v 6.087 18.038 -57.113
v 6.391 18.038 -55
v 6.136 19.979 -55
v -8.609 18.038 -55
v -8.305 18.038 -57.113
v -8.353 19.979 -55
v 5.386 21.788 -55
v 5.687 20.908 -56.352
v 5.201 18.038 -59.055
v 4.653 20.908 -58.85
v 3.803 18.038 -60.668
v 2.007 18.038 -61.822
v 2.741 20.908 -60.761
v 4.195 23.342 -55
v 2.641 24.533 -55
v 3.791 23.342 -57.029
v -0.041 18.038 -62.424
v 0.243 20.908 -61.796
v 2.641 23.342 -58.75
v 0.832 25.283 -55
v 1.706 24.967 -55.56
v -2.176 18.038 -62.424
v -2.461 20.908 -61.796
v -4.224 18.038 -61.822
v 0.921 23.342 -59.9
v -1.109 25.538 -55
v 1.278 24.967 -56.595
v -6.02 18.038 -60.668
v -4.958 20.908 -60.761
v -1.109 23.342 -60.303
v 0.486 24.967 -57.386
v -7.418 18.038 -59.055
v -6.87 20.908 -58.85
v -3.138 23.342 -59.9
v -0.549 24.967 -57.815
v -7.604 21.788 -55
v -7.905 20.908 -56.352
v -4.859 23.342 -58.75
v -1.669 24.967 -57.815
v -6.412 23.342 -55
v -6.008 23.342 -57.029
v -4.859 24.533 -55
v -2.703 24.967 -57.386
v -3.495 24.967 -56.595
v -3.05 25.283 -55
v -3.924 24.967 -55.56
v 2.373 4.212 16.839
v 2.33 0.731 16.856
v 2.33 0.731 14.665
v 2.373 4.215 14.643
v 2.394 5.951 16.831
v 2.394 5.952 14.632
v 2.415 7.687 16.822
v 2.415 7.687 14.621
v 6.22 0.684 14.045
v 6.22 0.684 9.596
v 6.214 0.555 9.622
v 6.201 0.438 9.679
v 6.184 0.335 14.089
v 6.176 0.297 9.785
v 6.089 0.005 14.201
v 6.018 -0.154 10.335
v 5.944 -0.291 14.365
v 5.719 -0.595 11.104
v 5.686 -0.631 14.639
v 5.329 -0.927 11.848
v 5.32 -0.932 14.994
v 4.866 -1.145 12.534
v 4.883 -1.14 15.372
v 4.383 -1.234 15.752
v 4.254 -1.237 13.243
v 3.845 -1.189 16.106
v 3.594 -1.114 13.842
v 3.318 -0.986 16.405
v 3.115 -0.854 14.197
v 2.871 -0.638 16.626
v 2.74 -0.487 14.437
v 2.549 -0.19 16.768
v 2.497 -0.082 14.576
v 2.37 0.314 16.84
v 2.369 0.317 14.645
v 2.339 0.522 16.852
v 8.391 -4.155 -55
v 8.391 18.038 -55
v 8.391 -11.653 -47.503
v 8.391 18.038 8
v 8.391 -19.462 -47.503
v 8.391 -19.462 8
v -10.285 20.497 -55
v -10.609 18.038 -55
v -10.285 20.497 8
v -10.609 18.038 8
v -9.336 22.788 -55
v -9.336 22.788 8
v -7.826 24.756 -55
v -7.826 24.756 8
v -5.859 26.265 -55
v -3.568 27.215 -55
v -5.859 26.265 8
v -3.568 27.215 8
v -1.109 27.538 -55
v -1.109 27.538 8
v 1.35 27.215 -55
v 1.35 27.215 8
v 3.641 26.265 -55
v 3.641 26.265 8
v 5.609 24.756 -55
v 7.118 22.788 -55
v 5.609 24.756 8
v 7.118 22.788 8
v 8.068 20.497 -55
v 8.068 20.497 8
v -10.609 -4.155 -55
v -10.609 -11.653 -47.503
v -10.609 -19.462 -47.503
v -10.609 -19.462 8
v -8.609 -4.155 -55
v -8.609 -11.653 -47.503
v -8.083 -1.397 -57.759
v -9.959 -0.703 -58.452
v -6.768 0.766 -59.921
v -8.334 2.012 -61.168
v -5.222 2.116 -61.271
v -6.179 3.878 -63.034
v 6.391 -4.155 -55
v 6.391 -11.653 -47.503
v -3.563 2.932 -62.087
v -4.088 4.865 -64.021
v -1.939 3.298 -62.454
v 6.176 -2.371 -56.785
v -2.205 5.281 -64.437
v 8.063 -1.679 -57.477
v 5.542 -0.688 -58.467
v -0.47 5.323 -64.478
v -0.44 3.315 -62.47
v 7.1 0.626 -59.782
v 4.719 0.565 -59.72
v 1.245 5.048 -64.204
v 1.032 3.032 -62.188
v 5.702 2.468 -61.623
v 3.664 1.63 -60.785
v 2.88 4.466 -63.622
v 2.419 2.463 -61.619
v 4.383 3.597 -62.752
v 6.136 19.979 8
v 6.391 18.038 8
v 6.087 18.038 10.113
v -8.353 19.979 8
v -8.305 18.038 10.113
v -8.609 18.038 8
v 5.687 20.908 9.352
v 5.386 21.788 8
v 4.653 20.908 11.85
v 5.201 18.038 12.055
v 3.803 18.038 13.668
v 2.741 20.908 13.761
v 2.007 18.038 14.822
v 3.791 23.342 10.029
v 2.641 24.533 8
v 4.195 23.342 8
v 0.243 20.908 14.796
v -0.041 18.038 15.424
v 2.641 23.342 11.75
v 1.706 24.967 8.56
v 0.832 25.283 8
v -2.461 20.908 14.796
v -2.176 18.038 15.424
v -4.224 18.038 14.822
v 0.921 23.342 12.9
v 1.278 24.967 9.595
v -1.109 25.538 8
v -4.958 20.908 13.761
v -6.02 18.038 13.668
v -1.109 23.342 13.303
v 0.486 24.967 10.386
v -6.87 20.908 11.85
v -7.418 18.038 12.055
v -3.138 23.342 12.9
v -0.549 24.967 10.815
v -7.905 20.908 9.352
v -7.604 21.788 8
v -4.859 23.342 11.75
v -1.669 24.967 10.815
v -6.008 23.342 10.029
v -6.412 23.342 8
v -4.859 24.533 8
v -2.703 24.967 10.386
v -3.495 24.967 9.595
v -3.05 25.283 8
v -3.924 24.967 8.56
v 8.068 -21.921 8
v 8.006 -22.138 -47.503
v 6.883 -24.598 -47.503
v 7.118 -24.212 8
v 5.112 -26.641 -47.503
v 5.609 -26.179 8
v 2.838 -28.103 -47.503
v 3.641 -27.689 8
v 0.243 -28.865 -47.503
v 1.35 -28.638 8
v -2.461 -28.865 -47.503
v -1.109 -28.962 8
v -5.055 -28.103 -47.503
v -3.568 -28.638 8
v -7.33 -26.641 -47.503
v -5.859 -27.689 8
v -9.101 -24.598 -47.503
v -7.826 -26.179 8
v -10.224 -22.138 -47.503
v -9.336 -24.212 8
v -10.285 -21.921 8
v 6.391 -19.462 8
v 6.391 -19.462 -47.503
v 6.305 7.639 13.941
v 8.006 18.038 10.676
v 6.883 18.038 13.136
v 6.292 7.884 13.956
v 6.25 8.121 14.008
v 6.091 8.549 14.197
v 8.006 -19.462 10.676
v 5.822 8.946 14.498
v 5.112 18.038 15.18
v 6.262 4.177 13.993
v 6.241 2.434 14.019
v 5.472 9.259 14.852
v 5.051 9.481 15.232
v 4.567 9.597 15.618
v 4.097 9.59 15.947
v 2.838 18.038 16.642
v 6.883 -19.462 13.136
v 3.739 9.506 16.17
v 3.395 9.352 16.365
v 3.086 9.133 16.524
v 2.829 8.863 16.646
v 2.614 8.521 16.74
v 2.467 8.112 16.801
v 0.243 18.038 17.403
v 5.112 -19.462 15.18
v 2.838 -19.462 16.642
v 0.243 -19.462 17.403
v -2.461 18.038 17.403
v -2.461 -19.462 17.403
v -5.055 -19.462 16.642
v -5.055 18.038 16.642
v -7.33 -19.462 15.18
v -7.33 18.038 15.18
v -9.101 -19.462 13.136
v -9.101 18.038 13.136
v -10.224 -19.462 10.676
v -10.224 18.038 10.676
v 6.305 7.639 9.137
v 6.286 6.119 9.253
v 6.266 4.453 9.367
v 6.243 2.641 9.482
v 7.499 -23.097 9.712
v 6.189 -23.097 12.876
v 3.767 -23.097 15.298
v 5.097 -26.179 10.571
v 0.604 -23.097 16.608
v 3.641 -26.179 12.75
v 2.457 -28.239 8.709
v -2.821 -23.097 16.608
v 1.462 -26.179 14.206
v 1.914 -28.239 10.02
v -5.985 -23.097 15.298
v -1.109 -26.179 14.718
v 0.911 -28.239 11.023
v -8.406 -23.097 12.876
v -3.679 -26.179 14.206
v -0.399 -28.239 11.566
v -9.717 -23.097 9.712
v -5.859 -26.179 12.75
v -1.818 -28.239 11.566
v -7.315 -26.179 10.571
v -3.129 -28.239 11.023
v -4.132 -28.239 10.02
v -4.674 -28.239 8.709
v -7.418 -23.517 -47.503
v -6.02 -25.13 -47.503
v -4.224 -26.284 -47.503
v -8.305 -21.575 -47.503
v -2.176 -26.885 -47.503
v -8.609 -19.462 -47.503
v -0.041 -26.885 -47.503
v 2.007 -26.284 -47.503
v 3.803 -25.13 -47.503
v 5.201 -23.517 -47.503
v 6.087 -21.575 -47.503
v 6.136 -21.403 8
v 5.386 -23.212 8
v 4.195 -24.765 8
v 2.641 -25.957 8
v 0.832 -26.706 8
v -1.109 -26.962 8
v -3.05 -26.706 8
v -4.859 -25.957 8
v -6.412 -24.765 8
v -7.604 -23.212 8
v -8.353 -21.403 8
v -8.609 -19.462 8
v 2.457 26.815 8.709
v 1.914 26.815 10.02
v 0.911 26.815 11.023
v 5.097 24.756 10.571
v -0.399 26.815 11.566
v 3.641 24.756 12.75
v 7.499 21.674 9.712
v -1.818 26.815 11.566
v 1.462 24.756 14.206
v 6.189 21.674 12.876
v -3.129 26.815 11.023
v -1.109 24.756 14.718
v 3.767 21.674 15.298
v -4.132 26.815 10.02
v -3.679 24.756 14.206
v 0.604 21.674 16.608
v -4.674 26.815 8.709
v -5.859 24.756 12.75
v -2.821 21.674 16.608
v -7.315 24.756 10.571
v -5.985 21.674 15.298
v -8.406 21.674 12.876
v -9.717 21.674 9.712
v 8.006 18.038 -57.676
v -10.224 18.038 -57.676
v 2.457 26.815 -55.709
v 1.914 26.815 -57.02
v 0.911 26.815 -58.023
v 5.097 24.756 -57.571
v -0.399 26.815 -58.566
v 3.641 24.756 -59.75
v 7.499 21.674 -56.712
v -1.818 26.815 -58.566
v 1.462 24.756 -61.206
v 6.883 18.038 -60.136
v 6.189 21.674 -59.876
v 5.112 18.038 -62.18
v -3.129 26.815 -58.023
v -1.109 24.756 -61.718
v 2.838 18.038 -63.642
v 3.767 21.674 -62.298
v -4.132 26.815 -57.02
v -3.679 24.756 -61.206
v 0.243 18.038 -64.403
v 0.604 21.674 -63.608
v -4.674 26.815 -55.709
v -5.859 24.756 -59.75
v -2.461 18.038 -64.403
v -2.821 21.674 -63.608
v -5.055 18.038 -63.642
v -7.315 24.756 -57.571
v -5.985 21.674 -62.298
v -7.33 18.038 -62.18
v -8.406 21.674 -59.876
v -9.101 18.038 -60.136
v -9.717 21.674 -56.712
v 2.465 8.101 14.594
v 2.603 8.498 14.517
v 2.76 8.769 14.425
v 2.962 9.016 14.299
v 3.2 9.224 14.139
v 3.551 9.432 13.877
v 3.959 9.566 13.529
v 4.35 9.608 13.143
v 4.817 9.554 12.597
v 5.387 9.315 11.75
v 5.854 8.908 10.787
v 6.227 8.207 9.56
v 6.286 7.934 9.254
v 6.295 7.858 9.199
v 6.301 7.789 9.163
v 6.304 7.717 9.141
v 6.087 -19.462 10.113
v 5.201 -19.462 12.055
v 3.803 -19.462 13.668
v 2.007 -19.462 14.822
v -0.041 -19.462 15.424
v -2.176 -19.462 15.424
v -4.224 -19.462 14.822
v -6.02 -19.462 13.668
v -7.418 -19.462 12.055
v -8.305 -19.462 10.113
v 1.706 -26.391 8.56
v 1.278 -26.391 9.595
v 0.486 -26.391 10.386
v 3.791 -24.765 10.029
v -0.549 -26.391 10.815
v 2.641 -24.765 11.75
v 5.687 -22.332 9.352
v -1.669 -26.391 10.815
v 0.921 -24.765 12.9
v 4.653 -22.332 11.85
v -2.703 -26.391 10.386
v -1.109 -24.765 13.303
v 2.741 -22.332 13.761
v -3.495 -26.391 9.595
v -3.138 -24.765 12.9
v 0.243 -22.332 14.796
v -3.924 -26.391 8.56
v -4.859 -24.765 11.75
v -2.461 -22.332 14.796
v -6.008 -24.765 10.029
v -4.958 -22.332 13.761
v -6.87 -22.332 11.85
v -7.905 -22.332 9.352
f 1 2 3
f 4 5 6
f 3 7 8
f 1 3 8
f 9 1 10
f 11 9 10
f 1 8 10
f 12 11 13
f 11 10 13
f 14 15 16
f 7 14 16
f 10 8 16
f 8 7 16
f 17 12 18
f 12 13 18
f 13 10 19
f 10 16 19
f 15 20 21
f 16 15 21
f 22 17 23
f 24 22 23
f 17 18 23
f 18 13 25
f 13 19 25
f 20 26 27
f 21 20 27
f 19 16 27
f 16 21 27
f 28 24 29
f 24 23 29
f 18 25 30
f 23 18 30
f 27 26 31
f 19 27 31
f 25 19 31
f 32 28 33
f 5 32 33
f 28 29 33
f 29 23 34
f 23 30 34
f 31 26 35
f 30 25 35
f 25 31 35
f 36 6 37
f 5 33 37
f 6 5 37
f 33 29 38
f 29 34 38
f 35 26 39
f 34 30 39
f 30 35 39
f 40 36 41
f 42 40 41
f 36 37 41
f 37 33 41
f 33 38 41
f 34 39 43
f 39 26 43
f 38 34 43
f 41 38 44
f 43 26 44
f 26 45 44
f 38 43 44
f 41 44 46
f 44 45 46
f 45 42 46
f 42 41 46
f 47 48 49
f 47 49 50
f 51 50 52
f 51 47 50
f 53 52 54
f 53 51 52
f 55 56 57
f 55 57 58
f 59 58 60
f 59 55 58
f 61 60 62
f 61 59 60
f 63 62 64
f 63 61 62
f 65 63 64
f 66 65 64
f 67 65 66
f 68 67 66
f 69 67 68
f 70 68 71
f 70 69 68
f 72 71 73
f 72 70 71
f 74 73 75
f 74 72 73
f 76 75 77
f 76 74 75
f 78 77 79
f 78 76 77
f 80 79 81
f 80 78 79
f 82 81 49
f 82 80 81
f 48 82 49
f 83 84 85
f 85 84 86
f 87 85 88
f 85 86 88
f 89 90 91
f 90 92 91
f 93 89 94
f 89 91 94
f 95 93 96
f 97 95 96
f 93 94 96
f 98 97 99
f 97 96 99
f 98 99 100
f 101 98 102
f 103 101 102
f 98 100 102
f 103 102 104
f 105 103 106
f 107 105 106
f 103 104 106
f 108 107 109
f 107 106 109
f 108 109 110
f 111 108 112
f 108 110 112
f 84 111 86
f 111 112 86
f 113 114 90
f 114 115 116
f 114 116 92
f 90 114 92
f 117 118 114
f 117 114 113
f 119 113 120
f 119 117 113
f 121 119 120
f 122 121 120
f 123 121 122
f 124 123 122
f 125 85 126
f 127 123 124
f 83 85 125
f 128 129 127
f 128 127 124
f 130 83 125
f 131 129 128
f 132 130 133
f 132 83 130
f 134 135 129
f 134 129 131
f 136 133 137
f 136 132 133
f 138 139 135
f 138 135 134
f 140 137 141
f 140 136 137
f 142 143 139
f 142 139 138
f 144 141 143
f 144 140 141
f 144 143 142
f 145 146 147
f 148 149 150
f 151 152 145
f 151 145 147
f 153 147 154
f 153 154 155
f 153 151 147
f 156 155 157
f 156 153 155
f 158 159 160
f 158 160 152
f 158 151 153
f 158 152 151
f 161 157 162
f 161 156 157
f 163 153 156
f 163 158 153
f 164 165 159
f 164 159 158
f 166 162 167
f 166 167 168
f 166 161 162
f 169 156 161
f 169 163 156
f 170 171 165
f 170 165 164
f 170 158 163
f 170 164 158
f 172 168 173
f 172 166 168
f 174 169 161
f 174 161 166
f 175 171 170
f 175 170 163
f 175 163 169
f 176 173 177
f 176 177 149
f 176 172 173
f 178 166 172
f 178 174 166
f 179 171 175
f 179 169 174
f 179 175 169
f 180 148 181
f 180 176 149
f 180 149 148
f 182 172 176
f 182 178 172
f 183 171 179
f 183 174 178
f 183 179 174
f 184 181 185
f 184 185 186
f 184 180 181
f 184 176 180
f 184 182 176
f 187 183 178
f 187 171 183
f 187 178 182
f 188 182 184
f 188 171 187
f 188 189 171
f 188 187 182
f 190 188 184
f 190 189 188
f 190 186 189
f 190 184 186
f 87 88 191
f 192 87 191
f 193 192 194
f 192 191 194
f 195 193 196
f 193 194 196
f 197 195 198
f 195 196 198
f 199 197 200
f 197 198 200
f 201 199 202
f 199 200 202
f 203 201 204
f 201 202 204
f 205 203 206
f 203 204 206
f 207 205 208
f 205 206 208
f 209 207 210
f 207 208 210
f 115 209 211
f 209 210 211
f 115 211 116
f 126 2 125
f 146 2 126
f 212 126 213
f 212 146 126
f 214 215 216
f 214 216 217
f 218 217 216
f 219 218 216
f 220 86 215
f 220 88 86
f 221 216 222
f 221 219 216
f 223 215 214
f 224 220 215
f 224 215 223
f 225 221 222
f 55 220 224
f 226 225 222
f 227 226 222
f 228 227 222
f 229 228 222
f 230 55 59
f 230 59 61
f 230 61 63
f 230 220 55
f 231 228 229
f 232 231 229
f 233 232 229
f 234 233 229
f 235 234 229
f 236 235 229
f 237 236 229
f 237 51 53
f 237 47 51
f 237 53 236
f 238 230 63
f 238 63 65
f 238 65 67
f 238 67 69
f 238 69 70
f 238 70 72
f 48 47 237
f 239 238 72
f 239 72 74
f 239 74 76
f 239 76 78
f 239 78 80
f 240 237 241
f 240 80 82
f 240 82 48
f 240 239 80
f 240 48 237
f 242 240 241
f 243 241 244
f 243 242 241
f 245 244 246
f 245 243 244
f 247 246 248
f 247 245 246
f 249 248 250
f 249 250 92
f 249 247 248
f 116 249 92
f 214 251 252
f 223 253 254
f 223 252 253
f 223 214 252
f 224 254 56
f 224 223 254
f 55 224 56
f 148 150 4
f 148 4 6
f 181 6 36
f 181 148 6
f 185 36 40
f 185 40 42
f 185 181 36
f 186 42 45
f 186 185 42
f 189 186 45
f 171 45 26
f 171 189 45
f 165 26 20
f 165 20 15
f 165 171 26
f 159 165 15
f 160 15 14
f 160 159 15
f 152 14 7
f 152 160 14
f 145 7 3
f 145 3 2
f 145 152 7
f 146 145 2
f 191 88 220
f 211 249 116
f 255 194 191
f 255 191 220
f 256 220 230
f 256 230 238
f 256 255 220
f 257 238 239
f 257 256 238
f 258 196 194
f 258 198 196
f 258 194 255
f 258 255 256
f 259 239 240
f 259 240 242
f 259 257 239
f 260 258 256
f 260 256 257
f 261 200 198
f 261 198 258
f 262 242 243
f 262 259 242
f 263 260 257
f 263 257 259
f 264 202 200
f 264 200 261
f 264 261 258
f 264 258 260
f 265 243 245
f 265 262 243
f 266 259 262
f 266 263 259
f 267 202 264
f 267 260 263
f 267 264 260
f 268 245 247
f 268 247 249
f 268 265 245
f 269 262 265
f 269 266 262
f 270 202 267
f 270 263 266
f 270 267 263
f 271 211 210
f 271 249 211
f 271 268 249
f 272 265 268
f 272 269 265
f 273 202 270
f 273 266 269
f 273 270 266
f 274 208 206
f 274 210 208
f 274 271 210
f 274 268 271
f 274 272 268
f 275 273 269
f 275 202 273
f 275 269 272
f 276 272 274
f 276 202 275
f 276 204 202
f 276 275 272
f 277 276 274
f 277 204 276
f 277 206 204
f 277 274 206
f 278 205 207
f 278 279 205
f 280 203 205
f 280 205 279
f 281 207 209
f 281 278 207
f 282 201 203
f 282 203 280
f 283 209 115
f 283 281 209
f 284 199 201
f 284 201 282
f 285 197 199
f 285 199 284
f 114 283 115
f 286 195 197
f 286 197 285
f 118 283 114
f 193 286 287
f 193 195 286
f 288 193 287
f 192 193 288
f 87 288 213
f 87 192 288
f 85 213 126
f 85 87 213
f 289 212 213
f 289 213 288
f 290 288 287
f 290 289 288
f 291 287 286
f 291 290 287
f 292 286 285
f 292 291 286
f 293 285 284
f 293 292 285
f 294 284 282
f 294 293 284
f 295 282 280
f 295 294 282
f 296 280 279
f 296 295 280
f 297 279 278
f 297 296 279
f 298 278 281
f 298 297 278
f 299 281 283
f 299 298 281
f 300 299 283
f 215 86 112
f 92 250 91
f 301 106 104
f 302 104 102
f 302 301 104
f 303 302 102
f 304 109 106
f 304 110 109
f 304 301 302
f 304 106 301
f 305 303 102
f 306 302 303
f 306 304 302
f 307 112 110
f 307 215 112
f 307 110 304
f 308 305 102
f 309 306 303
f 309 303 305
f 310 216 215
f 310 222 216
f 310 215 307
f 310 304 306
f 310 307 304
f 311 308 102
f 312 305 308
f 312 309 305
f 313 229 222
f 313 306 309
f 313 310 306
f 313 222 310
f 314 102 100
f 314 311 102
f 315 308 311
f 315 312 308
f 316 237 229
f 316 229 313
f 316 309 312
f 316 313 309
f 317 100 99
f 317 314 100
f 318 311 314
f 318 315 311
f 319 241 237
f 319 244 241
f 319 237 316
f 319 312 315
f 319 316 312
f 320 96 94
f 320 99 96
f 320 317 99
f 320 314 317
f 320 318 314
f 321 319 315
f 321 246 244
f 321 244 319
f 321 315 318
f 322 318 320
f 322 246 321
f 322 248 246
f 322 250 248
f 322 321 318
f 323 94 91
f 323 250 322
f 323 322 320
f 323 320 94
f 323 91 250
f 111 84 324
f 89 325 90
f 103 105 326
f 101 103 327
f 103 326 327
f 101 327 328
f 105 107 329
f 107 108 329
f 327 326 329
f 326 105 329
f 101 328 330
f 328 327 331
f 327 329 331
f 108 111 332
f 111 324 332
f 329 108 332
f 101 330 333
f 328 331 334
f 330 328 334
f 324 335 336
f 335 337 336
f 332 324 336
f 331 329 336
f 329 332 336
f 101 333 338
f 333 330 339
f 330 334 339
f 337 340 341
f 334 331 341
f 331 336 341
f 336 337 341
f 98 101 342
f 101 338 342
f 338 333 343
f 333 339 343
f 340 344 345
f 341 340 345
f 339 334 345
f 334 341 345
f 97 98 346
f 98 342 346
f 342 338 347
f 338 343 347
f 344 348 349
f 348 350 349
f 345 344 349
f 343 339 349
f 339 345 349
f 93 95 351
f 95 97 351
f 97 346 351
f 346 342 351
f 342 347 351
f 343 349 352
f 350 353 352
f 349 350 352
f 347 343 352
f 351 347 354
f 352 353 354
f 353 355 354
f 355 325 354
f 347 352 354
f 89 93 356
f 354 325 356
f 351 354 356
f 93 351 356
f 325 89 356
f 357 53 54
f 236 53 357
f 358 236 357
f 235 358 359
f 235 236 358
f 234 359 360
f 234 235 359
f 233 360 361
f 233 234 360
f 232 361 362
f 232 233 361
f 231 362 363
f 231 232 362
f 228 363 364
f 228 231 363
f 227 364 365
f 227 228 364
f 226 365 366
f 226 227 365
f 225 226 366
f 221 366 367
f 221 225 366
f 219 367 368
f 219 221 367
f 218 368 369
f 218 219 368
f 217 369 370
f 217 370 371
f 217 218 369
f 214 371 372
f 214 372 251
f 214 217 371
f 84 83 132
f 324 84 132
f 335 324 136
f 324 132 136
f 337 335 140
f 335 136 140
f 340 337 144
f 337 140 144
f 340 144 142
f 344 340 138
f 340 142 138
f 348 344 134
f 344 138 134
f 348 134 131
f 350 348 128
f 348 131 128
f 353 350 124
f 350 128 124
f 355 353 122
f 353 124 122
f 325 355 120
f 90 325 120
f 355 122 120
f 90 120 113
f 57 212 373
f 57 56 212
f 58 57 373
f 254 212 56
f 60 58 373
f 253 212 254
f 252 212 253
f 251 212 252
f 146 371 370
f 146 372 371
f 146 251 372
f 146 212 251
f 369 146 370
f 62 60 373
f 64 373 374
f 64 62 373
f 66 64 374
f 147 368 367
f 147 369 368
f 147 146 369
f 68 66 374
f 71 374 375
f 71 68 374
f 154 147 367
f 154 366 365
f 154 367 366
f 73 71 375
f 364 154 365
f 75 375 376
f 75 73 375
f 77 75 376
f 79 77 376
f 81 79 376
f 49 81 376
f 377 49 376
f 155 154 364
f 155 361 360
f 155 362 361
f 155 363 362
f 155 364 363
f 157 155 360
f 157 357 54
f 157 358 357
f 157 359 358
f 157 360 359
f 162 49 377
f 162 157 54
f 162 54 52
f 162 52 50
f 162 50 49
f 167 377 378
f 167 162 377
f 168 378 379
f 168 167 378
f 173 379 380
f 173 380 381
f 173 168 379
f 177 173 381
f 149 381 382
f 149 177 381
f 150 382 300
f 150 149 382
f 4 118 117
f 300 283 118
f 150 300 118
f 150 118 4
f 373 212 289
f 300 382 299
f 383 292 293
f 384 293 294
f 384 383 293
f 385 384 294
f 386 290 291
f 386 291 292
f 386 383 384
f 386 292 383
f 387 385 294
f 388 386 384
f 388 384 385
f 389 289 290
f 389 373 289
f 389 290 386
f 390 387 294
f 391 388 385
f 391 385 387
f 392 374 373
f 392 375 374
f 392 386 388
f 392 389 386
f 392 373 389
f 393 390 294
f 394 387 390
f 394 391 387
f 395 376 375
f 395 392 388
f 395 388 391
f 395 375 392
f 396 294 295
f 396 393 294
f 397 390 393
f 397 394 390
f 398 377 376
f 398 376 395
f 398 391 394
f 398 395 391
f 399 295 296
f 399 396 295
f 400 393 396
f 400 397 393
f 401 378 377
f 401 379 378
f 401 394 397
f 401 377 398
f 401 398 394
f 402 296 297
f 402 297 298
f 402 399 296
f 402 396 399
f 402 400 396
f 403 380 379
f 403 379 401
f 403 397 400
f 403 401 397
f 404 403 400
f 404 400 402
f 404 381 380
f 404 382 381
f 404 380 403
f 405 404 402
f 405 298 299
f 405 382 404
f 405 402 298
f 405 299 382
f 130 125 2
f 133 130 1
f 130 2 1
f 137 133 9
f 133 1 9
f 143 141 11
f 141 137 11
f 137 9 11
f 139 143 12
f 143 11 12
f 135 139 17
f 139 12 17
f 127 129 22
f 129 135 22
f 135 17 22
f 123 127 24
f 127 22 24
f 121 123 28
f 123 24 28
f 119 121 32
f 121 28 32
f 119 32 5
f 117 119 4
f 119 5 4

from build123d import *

# Parameters (mm, degrees)
EXTRUDE_THIN1_DEPTH      = 8
EXTRUDE_THIN1_DEPTH_BACK = 55
REVOLVE1_ANGLE           = 180
CUT_EXTRUDE1_DEPTH       = 1
CUT_EXTRUDE1_DEPTH_BACK  = 73.5
REVOLVE2_ANGLE           = 180
CUT_EXTRUDE2_DEPTH       = 1.0000001
CUT_EXTRUDE2_DEPTH_BACK  = 20.0000001


with BuildPart() as part:
    # Sketch1 → Extrude-Thin1 (new body, two sides)
    with BuildSketch(Plane.XY) as extrude_thin1_sk:
        with BuildLine():
            Line((-10.608745061, -19.461766721), (-10.608745061, 18.038233279))
            ThreePointArc((-10.608745061, 18.038233279), (-1.108745061, 27.538233279), (8.391254939, 18.038233279))
            Line((8.391254939, 18.038233279), (8.391254939, -19.461766721))
            ThreePointArc((8.391254939, -19.461766721), (-1.108745061, -28.961766721), (-10.608745061, -19.461766721))
        make_face()
        with BuildLine():
            Line((-8.608745061, -19.461766721), (-8.608745061, 18.038233279))
            ThreePointArc((-8.608745061, 18.038233279), (-1.108745061, 25.538233279), (6.391254939, 18.038233279))
            Line((6.391254939, 18.038233279), (6.391254939, -19.461766721))
            ThreePointArc((6.391254939, -19.461766721), (-1.108745061, -26.961766721), (-8.608745061, -19.461766721))
        make_face(mode=Mode.SUBTRACT)
    extrude(amount=EXTRUDE_THIN1_DEPTH)
    extrude(extrude_thin1_sk.sketch, amount=-EXTRUDE_THIN1_DEPTH_BACK)

    # Sketch3 → Revolve1 (revolve)
    with BuildSketch(Plane.XY.offset(8)):
        with BuildLine():
            Line((6.391254939, -19.461766721), (6.391254939, 18.038233279))
            ThreePointArc((6.391254939, 18.038233279), (4.194555798, 23.341534137), (-1.108745061, 25.538233279))
            Line((-1.108745061, 25.538233279), (-1.108745061, 27.538233279))
            ThreePointArc((-1.108745061, 27.538233279), (5.608769361, 24.7557477), (8.391254939, 18.038233279))
            Line((8.391254939, 18.038233279), (8.391254939, -19.461766721))
            ThreePointArc((8.391254939, -19.461766721), (5.608769361, -26.179281143), (-1.108745061, -28.961766721))
            Line((-1.108745061, -28.961766721), (-1.108745061, -26.961766721))
            ThreePointArc((-1.108745061, -26.961766721), (4.194555798, -24.76506758), (6.391254939, -19.461766721))
        make_face()
    revolve(axis=Axis((-1.108745061, 27.538233279, 8), (0, -1, 0)), revolution_arc=REVOLVE1_ANGLE)

    # Sketch4 → Cut-Extrude1 (cut, two sides)
    with BuildSketch(Plane(origin=(-1.108745061, -19.461766721, 17.5), x_dir=(1, 0, 0), z_dir=(0, 0, 1))) as cut_extrude1_sk:
        with BuildLine():
            Line((7.413248602, 27.101186929), (7.328248101, 20.145490054))
            ThreePointArc((7.328248101, 20.145490054), (5.359735954, 18.224508573), (3.438754472, 20.19302072))
            Line((3.438754472, 20.19302072), (3.523754973, 27.148717596))
            ThreePointArc((3.523754973, 27.148717596), (5.492267121, 29.069699077), (7.413248602, 27.101186929))
        make_face()
    extrude(amount=CUT_EXTRUDE1_DEPTH, mode=Mode.SUBTRACT)
    extrude(cut_extrude1_sk.sketch, amount=-CUT_EXTRUDE1_DEPTH_BACK, mode=Mode.SUBTRACT)

    # Sketch5 → Revolve2 (revolve)
    with BuildSketch(Plane(origin=(0, 0, -55), x_dir=(-1, 0, 0), z_dir=(0, 0, -1))):
        with BuildLine():
            Line((-6.391254939, -19.461766721), (-6.391254939, 18.038233279))
            ThreePointArc((-6.391254939, 18.038233279), (-4.194555798, 23.341534137), (1.108745061, 25.538233279))
            Line((1.108745061, 25.538233279), (1.108745061, 27.538233279))
            ThreePointArc((1.108745061, 27.538233279), (-5.608769361, 24.7557477), (-8.391254939, 18.038233279))
            Line((-8.391254939, 18.038233279), (-8.391254939, -19.461766721))
            ThreePointArc((-8.391254939, -19.461766721), (-5.608769361, -26.179281143), (1.108745061, -28.961766721))
            Line((1.108745061, -28.961766721), (1.108745061, -26.961766721))
            ThreePointArc((1.108745061, -26.961766721), (-4.194555798, -24.76506758), (-6.391254939, -19.461766721))
        make_face()
    revolve(axis=Axis((-1.108745061, -28.961766721, -55), (0, 1, 0)), revolution_arc=REVOLVE2_ANGLE)

    # Sketch6 → Cut-Extrude2 (cut, two sides)
    with BuildSketch(Plane(origin=(8.391254939, 0, 0), x_dir=(0, 0, -1), z_dir=(1, 0, 0))) as cut_extrude2_sk:
        Polygon((47.502612286, -35.061794905), (47.502612286, -11.65288681), (66.549267121, 7.393768025), (66.549267121, -35.061794905), align=None)
    extrude(amount=CUT_EXTRUDE2_DEPTH, mode=Mode.SUBTRACT)
    extrude(cut_extrude2_sk.sketch, amount=-CUT_EXTRUDE2_DEPTH_BACK, mode=Mode.SUBTRACT)


solid = part.part
